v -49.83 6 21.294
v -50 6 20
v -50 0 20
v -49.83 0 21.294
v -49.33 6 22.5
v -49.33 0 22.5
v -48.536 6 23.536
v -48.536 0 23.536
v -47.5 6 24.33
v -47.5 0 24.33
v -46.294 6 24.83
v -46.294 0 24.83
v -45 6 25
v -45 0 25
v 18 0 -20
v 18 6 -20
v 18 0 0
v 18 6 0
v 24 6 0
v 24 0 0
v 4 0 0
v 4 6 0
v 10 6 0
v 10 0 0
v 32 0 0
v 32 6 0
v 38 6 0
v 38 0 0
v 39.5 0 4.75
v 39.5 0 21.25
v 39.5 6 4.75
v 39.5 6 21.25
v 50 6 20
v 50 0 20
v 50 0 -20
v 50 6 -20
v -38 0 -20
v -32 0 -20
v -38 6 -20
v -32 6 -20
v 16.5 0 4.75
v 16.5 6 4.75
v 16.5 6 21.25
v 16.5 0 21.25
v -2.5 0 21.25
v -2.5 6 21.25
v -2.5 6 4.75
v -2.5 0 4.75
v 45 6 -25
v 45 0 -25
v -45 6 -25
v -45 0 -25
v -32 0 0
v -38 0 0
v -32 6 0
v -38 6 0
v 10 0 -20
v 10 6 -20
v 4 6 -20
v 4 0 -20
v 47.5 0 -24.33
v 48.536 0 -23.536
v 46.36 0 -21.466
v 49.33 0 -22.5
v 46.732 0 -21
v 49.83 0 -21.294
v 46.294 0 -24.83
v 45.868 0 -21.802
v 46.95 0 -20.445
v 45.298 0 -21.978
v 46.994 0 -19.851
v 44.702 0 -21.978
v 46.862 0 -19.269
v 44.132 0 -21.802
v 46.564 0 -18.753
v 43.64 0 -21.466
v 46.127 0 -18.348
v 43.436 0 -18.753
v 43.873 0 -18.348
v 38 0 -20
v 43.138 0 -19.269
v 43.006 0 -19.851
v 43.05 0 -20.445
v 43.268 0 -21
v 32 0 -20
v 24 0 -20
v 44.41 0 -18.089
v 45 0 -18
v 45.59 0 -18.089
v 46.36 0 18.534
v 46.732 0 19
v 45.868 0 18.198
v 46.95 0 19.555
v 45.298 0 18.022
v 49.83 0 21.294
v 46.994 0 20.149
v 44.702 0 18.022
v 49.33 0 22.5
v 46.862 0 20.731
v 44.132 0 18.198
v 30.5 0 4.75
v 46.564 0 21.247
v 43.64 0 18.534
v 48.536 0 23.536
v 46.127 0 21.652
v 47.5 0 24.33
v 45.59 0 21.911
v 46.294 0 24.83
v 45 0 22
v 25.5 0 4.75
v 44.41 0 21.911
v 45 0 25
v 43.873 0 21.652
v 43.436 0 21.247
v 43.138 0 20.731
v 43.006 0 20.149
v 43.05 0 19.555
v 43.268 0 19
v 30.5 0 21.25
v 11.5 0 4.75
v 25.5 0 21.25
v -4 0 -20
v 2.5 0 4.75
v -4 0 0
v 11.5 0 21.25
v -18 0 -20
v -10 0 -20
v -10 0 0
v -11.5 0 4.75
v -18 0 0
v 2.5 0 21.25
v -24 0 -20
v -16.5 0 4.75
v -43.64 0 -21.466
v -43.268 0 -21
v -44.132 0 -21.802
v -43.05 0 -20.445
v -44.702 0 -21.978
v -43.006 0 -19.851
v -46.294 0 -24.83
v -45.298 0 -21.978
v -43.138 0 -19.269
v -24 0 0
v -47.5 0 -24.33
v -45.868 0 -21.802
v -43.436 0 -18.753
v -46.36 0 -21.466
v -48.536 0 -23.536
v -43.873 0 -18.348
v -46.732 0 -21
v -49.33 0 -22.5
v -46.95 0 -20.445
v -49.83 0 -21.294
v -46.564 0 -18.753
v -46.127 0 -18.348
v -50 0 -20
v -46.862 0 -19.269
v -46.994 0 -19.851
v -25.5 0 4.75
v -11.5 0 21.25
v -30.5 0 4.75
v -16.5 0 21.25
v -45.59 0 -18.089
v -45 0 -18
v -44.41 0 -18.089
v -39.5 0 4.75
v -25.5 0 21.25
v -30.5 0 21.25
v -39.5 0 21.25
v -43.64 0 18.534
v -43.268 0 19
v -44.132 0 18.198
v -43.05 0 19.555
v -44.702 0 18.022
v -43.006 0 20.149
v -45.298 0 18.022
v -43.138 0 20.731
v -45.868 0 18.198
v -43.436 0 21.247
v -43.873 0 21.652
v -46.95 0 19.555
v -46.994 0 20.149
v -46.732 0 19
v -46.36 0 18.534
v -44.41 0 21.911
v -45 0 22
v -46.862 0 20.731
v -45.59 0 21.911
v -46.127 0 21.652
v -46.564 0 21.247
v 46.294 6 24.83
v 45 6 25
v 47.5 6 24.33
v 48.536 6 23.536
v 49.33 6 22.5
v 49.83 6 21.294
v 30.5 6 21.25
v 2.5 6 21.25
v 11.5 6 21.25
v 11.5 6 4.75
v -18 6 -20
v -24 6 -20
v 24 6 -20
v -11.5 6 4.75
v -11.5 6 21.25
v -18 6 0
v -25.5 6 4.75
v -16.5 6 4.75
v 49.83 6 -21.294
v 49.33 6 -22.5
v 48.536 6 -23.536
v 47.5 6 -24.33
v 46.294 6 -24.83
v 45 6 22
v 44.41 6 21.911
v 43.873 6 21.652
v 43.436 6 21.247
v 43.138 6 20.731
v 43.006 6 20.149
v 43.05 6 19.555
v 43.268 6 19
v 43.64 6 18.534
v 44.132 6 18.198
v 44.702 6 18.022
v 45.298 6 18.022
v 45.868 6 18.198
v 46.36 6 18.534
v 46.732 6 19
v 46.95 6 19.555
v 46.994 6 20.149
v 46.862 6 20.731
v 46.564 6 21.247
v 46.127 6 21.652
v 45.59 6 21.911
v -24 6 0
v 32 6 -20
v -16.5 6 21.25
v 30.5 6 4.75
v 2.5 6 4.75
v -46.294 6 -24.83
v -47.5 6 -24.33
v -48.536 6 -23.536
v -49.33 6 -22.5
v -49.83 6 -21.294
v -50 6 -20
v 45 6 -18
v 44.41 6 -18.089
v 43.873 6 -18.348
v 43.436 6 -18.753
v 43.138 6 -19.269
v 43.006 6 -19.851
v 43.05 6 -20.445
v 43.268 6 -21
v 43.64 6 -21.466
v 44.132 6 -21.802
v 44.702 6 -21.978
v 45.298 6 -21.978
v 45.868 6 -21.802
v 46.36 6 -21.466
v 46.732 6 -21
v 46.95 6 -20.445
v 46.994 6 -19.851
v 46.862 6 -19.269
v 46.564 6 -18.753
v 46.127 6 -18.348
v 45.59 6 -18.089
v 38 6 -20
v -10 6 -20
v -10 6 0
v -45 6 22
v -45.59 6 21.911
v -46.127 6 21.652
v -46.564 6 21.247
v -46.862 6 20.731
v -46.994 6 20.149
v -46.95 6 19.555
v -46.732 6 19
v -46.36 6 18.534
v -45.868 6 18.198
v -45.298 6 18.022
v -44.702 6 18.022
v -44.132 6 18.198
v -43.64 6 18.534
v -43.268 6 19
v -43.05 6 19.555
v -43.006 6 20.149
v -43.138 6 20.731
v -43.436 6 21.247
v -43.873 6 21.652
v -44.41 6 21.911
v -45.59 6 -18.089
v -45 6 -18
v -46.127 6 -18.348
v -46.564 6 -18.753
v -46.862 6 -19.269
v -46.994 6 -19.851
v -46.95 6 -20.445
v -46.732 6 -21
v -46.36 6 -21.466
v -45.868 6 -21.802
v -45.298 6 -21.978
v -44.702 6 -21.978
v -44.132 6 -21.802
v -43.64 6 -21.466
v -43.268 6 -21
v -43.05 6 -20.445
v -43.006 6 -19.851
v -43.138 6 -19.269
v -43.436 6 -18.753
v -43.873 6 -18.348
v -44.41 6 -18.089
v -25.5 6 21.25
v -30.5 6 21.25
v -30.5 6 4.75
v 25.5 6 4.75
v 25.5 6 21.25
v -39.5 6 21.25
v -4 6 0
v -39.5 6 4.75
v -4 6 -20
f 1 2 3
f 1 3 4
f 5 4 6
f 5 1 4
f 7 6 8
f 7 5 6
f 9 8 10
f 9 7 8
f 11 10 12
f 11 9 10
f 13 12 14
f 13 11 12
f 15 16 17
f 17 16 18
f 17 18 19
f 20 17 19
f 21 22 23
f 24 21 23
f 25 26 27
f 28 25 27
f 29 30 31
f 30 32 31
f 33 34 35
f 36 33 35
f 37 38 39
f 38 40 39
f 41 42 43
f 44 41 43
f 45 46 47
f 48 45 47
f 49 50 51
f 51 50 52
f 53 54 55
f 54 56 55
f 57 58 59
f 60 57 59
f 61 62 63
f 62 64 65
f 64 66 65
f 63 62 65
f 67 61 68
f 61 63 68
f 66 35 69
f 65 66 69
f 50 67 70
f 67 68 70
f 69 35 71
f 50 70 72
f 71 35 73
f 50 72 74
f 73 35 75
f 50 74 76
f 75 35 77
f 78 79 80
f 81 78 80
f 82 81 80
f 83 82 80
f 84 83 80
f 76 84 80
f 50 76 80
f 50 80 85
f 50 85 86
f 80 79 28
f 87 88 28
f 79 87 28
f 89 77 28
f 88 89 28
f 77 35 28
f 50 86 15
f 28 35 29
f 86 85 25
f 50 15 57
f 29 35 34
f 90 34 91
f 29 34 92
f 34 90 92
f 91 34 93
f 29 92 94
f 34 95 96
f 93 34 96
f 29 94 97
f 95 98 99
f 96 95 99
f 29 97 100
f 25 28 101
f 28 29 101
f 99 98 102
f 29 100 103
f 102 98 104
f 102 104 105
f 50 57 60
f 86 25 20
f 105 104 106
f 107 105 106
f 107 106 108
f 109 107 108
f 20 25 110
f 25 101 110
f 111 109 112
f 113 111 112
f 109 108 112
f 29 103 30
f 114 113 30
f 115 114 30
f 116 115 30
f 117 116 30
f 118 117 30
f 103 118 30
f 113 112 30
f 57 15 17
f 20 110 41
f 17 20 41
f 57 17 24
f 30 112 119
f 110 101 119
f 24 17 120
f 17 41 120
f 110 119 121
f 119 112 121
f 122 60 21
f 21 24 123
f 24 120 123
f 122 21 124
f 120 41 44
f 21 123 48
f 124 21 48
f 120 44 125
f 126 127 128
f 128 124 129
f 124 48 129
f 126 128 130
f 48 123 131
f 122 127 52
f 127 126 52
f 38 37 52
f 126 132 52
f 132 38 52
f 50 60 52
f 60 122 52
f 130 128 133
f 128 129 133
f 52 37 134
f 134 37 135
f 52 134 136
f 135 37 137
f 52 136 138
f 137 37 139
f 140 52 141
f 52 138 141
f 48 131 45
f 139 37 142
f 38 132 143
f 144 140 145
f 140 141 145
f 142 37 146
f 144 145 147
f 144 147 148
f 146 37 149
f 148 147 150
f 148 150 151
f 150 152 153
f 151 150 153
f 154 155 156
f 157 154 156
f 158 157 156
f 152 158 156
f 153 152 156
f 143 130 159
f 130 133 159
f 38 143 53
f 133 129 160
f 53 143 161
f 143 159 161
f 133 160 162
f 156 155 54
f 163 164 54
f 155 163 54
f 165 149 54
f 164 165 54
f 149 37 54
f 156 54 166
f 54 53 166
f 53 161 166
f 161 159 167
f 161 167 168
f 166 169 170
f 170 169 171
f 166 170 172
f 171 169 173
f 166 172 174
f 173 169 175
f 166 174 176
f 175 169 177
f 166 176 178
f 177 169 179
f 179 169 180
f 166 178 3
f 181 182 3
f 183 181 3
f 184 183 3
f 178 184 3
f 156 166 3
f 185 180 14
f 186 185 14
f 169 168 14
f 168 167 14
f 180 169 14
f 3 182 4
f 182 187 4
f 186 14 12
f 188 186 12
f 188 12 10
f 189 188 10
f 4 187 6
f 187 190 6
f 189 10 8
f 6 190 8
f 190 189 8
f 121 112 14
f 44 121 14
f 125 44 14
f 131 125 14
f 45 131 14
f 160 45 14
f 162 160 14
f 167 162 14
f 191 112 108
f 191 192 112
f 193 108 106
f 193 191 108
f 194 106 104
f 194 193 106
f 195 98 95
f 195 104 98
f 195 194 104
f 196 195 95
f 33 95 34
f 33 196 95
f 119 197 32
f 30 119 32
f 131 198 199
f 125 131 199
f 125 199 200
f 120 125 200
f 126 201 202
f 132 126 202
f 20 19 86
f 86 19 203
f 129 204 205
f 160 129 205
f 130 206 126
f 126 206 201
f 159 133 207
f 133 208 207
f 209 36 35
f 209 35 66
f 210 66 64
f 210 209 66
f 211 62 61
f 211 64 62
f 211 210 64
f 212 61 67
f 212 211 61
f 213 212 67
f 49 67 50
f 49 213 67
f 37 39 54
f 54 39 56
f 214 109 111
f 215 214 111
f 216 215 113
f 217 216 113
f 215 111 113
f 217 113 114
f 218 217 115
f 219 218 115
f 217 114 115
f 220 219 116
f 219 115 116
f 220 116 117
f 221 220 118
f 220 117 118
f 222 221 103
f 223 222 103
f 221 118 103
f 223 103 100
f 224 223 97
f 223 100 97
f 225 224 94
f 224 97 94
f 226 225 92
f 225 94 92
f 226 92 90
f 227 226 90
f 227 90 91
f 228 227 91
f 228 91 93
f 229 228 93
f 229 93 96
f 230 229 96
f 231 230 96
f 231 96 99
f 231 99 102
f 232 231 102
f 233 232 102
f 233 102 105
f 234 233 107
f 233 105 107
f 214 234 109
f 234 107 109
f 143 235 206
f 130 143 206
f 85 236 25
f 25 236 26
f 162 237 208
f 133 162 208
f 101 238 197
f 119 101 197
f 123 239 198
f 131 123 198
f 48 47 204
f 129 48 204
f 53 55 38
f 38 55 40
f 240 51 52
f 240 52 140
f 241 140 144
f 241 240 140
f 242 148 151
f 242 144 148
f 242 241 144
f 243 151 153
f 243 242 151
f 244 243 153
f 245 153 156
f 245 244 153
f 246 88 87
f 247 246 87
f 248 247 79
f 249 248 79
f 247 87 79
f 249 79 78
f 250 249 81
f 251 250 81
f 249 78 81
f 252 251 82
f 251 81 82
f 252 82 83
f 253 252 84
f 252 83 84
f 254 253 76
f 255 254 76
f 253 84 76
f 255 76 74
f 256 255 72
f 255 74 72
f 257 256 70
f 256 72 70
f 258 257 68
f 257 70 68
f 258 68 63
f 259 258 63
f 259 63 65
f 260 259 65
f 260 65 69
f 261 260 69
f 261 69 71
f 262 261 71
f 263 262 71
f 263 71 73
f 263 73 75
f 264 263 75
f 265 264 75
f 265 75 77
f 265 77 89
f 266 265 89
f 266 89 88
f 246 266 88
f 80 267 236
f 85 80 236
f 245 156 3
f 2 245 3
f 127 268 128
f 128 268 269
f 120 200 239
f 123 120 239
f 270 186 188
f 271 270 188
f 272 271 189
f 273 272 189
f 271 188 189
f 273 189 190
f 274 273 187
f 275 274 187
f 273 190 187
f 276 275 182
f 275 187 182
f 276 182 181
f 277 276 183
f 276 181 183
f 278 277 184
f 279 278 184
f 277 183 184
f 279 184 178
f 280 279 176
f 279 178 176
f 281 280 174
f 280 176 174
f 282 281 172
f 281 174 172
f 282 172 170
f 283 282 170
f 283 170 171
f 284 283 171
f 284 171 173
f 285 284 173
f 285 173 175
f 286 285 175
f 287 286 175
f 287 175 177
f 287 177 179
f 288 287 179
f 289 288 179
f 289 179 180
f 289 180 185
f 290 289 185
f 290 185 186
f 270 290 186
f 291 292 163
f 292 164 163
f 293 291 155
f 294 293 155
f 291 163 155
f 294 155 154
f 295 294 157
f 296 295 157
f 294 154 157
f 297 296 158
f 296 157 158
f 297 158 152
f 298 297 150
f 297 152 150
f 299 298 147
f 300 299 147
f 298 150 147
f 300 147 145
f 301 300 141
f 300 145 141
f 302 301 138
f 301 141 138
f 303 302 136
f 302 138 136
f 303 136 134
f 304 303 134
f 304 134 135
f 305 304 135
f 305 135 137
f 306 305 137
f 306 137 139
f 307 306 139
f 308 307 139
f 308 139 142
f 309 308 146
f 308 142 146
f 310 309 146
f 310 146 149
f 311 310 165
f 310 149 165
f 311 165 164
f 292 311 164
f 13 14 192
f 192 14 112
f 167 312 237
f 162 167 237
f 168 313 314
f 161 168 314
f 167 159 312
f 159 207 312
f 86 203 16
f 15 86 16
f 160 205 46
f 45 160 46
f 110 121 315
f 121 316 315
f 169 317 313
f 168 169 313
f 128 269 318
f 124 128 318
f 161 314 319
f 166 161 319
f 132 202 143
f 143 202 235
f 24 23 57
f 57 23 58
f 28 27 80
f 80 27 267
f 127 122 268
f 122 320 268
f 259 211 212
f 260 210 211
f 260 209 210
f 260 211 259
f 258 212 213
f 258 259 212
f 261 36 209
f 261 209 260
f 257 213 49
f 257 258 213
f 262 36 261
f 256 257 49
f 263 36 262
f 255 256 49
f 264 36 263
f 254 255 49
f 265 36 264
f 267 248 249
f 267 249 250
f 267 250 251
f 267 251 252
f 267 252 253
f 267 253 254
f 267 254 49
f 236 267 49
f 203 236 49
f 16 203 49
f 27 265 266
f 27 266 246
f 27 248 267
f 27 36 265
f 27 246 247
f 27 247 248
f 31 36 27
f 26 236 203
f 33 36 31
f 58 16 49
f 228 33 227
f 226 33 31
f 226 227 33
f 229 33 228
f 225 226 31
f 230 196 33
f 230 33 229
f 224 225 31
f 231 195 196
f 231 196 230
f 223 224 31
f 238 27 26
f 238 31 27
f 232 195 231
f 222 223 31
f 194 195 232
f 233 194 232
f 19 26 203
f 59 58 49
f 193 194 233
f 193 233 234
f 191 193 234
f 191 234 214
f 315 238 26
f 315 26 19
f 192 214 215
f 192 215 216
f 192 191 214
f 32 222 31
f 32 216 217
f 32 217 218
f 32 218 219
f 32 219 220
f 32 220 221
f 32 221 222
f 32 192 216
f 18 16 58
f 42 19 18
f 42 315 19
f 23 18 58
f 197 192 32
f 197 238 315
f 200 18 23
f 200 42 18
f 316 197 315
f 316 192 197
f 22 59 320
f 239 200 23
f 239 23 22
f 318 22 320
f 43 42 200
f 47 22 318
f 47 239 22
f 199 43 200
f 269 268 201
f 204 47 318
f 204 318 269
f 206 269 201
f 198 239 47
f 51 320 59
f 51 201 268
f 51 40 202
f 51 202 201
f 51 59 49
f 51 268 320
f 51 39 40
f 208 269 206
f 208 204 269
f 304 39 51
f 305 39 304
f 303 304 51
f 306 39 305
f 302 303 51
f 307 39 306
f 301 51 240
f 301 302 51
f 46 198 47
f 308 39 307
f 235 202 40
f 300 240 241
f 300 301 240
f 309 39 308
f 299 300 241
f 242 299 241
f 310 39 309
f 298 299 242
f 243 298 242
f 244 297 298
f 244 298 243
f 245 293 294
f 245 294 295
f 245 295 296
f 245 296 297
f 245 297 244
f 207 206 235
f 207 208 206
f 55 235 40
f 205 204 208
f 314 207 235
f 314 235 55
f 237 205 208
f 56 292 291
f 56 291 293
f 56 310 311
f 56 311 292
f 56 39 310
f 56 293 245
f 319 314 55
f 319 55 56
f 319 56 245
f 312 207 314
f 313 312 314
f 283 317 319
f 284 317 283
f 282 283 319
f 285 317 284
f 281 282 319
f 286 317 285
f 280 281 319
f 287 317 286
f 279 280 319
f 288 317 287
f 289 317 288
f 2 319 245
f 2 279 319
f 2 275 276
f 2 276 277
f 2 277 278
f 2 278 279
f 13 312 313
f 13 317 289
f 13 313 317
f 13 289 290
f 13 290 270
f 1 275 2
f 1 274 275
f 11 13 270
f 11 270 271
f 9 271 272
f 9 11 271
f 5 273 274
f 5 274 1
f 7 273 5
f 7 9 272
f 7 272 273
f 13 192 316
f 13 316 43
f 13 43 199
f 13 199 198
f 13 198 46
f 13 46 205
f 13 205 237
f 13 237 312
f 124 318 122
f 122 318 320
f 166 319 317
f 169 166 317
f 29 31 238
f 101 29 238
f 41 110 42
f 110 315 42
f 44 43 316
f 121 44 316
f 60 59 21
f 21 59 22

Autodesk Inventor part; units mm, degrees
ref_plane "YZ Plane" through (0, 0, 0) normal (1, 0, 0) x (0, 1, 0)
ref_plane "XZ Plane" through (0, 0, 0) normal (0, 1, 0) x (-1, 0, 0)
ref_plane "XY Plane" through (0, 0, 0) normal (0, 0, 1) x (1, 0, 0)
sketch "Sketch1" plane through (0, 0, 0) normal (0, 1, 0) x (-1, 0, 0)
  line L0 (50, 25) -> (-50, 25)
  line L1 (-50, 25) -> (-50, -25)
  line L2 (-50, -25) -> (50, -25)
  line L3 (50, -25) -> (50, 25)
  line L4 (50, 25) -> (-50, -25) construction
  line L5 (-50, 25) -> (50, -25) construction
  point P0 (0, 0)
  dimension "d0" = 100
  dimension "d1" = 50
extrude "Extrusion1" add sketch "Sketch1" along normal blind 6
fillet "Fillet1" radius 5 4 edges at (50, 3, 25) (50, 3, -25) (-50, 3, -25) (-50, 3, 25)
sketch "Sketch2" plane through (0, 6, 0) normal (0, 1, 0) x (1, 0, 0)
  line L0 (-39.5, -21.25) -> (-30.5, -21.25)
  line L1 (-30.5, -21.25) -> (-30.5, -4.75)
  line L2 (-30.5, -4.75) -> (-39.5, -4.75)
  line L3 (-39.5, -4.75) -> (-39.5, -21.25)
  line L4 (-39.5, -21.25) -> (-30.5, -4.75) construction
  line L5 (-30.5, -21.25) -> (-39.5, -4.75) construction
  line L6 (-25.5, -21.25) -> (-16.5, -21.25)
  line L7 (-16.5, -21.25) -> (-16.5, -4.75)
  line L8 (-16.5, -4.75) -> (-25.5, -4.75)
  line L9 (-25.5, -4.75) -> (-25.5, -21.25)
  line L10 (-25.5, -21.25) -> (-16.5, -4.75) construction
  line L11 (-16.5, -21.25) -> (-25.5, -4.75) construction
  line L12 (-11.5, -21.25) -> (-2.5, -21.25)
  line L13 (-2.5, -21.25) -> (-2.5, -4.75)
  line L14 (-2.5, -4.75) -> (-11.5, -4.75)
  line L15 (-11.5, -4.75) -> (-11.5, -21.25)
  line L16 (-11.5, -21.25) -> (-2.5, -4.75) construction
  line L17 (-2.5, -21.25) -> (-11.5, -4.75) construction
  line L18 (2.5, -21.25) -> (11.5, -21.25)
  line L19 (11.5, -21.25) -> (11.5, -4.75)
  line L20 (11.5, -4.75) -> (2.5, -4.75)
  line L21 (2.5, -4.75) -> (2.5, -21.25)
  line L22 (2.5, -21.25) -> (11.5, -4.75) construction
  line L23 (11.5, -21.25) -> (2.5, -4.75) construction
  line L24 (16.5, -21.25) -> (25.5, -21.25)
  line L25 (25.5, -21.25) -> (25.5, -4.75)
  line L26 (25.5, -4.75) -> (16.5, -4.75)
  line L27 (16.5, -4.75) -> (16.5, -21.25)
  line L28 (16.5, -21.25) -> (25.5, -4.75) construction
  line L29 (25.5, -21.25) -> (16.5, -4.75) construction
  line L30 (30.5, -21.25) -> (39.5, -21.25)
  line L31 (39.5, -21.25) -> (39.5, -4.75)
  line L32 (39.5, -4.75) -> (30.5, -4.75)
  line L33 (30.5, -4.75) -> (30.5, -21.25)
  line L34 (30.5, -21.25) -> (39.5, -4.75) construction
  line L35 (39.5, -21.25) -> (30.5, -4.75) construction
  line L36 (-45, -25) -> (45, -25) projected
  line L37 (-50, 20) -> (-50, -20) projected
  point P0 (0, 0)
  point P1 (-35, -13)
  point P2 (-21, -13)
  point P3 (-7, -13)
  point P4 (7, -13)
  point P5 (21, -13)
  point P6 (35, -13)
  dimension "d5" = 9
  dimension "d6" = 16.5
  dimension "d9" = 14
  dimension "d14" = 7
  dimension "d15" = 13
  dimension "d44" = 12
  dimension "d45" = 15
extrude "Extrusion2" cut sketch "Sketch2" against normal blind 10
sketch "Sketch3" plane through (0, 6, 0) normal (0, 1, 0) x (1, 0, 0)
  line L0 (-16.5, -21.25) -> (-25.5, -21.25) projected
  line L1 (-45, -25) -> (45, -25) projected
  line L2 (45, 25) -> (-45, 25) projected
  line L3 (-38, 0) -> (-32, 0)
  line L4 (-32, 0) -> (-32, 20)
  line L5 (-32, 20) -> (-38, 20)
  line L6 (-38, 20) -> (-38, 0)
  line L7 (-38, 0) -> (-32, 20) construction
  line L8 (-32, 0) -> (-38, 20) construction
  line L9 (-24, 0) -> (-18, 0)
  line L10 (-18, 0) -> (-18, 20)
  line L11 (-18, 20) -> (-24, 20)
  line L12 (-24, 20) -> (-24, 0)
  line L13 (-24, 0) -> (-18, 20) construction
  line L14 (-18, 0) -> (-24, 20) construction
  line L15 (-10, 0) -> (-4, 0)
  line L16 (-4, 0) -> (-4, 20)
  line L17 (-4, 20) -> (-10, 20)
  line L18 (-10, 20) -> (-10, 0)
  line L19 (-10, 0) -> (-4, 20) construction
  line L20 (-4, 0) -> (-10, 20) construction
  line L21 (4, 0) -> (10, 0)
  line L22 (10, 0) -> (10, 20)
  line L23 (10, 20) -> (4, 20)
  line L24 (4, 20) -> (4, 0)
  line L25 (4, 0) -> (10, 20) construction
  line L26 (10, 0) -> (4, 20) construction
  line L27 (18, 0) -> (24, 0)
  line L28 (24, 0) -> (24, 20)
  line L29 (24, 20) -> (18, 20)
  line L30 (18, 20) -> (18, 0)
  line L31 (18, 0) -> (24, 20) construction
  line L32 (24, 0) -> (18, 20) construction
  line L33 (32, 0) -> (38, 0)
  line L34 (38, 0) -> (38, 20)
  line L35 (38, 20) -> (32, 20)
  line L36 (32, 20) -> (32, 0)
  line L37 (32, 0) -> (38, 20) construction
  line L38 (38, 0) -> (32, 20) construction
  line L39 (-50, 20) -> (-50, -20) projected
  point P0 (0, 0)
  point P1 (-35, 10)
  point P2 (-21, 10)
  point P3 (-7, 10)
  point P4 (7, 10)
  point P5 (21, 10)
  point P6 (35, 10)
  dimension "d20" = 14
  dimension "d25" = 7
  dimension "d26" = 6
  dimension "d27" = 20
  dimension "d28" = 5
  dimension "d29" = 3.75
  dimension "d41" = 15
  dimension "d42" = 15
  dimension "d43" = 35
extrude "Extrusion3" cut sketch "Sketch3" against normal blind 10
sketch "Sketch4" plane through (0, 6, 0) normal (0, 1, 0) x (1, 0, 0)
  arc A0 (-50, -20) -> (-45, -25) centre (-45, -20) ccw projected
  arc A1 (45, -25) -> (50, -20) centre (45, -20) ccw projected
  arc A2 (50, 20) -> (45, 25) centre (45, 20) ccw projected
  arc A3 (-45, 25) -> (-50, 20) centre (-45, 20) ccw projected
  line L0 (45, 25) -> (-45, 25) projected
  line L1 (-50, 20) -> (-50, -20) projected
  point P0 (0, 0)
  dimension "d39" = 5
  dimension "d40" = 5
hole "Hole1" at (-45, 6, -20) at (45, 6, -20) at (45, 6, 20) at (-45, 6, 20) direction (0, -1, 0) diameter 4 end through all
equation "\"d14\" = 0.5 * d9"
equation "\"d25\" = 0.5 * d20"
properties part number "AcrylicUpperTop" material "Acrylic, Clear"
